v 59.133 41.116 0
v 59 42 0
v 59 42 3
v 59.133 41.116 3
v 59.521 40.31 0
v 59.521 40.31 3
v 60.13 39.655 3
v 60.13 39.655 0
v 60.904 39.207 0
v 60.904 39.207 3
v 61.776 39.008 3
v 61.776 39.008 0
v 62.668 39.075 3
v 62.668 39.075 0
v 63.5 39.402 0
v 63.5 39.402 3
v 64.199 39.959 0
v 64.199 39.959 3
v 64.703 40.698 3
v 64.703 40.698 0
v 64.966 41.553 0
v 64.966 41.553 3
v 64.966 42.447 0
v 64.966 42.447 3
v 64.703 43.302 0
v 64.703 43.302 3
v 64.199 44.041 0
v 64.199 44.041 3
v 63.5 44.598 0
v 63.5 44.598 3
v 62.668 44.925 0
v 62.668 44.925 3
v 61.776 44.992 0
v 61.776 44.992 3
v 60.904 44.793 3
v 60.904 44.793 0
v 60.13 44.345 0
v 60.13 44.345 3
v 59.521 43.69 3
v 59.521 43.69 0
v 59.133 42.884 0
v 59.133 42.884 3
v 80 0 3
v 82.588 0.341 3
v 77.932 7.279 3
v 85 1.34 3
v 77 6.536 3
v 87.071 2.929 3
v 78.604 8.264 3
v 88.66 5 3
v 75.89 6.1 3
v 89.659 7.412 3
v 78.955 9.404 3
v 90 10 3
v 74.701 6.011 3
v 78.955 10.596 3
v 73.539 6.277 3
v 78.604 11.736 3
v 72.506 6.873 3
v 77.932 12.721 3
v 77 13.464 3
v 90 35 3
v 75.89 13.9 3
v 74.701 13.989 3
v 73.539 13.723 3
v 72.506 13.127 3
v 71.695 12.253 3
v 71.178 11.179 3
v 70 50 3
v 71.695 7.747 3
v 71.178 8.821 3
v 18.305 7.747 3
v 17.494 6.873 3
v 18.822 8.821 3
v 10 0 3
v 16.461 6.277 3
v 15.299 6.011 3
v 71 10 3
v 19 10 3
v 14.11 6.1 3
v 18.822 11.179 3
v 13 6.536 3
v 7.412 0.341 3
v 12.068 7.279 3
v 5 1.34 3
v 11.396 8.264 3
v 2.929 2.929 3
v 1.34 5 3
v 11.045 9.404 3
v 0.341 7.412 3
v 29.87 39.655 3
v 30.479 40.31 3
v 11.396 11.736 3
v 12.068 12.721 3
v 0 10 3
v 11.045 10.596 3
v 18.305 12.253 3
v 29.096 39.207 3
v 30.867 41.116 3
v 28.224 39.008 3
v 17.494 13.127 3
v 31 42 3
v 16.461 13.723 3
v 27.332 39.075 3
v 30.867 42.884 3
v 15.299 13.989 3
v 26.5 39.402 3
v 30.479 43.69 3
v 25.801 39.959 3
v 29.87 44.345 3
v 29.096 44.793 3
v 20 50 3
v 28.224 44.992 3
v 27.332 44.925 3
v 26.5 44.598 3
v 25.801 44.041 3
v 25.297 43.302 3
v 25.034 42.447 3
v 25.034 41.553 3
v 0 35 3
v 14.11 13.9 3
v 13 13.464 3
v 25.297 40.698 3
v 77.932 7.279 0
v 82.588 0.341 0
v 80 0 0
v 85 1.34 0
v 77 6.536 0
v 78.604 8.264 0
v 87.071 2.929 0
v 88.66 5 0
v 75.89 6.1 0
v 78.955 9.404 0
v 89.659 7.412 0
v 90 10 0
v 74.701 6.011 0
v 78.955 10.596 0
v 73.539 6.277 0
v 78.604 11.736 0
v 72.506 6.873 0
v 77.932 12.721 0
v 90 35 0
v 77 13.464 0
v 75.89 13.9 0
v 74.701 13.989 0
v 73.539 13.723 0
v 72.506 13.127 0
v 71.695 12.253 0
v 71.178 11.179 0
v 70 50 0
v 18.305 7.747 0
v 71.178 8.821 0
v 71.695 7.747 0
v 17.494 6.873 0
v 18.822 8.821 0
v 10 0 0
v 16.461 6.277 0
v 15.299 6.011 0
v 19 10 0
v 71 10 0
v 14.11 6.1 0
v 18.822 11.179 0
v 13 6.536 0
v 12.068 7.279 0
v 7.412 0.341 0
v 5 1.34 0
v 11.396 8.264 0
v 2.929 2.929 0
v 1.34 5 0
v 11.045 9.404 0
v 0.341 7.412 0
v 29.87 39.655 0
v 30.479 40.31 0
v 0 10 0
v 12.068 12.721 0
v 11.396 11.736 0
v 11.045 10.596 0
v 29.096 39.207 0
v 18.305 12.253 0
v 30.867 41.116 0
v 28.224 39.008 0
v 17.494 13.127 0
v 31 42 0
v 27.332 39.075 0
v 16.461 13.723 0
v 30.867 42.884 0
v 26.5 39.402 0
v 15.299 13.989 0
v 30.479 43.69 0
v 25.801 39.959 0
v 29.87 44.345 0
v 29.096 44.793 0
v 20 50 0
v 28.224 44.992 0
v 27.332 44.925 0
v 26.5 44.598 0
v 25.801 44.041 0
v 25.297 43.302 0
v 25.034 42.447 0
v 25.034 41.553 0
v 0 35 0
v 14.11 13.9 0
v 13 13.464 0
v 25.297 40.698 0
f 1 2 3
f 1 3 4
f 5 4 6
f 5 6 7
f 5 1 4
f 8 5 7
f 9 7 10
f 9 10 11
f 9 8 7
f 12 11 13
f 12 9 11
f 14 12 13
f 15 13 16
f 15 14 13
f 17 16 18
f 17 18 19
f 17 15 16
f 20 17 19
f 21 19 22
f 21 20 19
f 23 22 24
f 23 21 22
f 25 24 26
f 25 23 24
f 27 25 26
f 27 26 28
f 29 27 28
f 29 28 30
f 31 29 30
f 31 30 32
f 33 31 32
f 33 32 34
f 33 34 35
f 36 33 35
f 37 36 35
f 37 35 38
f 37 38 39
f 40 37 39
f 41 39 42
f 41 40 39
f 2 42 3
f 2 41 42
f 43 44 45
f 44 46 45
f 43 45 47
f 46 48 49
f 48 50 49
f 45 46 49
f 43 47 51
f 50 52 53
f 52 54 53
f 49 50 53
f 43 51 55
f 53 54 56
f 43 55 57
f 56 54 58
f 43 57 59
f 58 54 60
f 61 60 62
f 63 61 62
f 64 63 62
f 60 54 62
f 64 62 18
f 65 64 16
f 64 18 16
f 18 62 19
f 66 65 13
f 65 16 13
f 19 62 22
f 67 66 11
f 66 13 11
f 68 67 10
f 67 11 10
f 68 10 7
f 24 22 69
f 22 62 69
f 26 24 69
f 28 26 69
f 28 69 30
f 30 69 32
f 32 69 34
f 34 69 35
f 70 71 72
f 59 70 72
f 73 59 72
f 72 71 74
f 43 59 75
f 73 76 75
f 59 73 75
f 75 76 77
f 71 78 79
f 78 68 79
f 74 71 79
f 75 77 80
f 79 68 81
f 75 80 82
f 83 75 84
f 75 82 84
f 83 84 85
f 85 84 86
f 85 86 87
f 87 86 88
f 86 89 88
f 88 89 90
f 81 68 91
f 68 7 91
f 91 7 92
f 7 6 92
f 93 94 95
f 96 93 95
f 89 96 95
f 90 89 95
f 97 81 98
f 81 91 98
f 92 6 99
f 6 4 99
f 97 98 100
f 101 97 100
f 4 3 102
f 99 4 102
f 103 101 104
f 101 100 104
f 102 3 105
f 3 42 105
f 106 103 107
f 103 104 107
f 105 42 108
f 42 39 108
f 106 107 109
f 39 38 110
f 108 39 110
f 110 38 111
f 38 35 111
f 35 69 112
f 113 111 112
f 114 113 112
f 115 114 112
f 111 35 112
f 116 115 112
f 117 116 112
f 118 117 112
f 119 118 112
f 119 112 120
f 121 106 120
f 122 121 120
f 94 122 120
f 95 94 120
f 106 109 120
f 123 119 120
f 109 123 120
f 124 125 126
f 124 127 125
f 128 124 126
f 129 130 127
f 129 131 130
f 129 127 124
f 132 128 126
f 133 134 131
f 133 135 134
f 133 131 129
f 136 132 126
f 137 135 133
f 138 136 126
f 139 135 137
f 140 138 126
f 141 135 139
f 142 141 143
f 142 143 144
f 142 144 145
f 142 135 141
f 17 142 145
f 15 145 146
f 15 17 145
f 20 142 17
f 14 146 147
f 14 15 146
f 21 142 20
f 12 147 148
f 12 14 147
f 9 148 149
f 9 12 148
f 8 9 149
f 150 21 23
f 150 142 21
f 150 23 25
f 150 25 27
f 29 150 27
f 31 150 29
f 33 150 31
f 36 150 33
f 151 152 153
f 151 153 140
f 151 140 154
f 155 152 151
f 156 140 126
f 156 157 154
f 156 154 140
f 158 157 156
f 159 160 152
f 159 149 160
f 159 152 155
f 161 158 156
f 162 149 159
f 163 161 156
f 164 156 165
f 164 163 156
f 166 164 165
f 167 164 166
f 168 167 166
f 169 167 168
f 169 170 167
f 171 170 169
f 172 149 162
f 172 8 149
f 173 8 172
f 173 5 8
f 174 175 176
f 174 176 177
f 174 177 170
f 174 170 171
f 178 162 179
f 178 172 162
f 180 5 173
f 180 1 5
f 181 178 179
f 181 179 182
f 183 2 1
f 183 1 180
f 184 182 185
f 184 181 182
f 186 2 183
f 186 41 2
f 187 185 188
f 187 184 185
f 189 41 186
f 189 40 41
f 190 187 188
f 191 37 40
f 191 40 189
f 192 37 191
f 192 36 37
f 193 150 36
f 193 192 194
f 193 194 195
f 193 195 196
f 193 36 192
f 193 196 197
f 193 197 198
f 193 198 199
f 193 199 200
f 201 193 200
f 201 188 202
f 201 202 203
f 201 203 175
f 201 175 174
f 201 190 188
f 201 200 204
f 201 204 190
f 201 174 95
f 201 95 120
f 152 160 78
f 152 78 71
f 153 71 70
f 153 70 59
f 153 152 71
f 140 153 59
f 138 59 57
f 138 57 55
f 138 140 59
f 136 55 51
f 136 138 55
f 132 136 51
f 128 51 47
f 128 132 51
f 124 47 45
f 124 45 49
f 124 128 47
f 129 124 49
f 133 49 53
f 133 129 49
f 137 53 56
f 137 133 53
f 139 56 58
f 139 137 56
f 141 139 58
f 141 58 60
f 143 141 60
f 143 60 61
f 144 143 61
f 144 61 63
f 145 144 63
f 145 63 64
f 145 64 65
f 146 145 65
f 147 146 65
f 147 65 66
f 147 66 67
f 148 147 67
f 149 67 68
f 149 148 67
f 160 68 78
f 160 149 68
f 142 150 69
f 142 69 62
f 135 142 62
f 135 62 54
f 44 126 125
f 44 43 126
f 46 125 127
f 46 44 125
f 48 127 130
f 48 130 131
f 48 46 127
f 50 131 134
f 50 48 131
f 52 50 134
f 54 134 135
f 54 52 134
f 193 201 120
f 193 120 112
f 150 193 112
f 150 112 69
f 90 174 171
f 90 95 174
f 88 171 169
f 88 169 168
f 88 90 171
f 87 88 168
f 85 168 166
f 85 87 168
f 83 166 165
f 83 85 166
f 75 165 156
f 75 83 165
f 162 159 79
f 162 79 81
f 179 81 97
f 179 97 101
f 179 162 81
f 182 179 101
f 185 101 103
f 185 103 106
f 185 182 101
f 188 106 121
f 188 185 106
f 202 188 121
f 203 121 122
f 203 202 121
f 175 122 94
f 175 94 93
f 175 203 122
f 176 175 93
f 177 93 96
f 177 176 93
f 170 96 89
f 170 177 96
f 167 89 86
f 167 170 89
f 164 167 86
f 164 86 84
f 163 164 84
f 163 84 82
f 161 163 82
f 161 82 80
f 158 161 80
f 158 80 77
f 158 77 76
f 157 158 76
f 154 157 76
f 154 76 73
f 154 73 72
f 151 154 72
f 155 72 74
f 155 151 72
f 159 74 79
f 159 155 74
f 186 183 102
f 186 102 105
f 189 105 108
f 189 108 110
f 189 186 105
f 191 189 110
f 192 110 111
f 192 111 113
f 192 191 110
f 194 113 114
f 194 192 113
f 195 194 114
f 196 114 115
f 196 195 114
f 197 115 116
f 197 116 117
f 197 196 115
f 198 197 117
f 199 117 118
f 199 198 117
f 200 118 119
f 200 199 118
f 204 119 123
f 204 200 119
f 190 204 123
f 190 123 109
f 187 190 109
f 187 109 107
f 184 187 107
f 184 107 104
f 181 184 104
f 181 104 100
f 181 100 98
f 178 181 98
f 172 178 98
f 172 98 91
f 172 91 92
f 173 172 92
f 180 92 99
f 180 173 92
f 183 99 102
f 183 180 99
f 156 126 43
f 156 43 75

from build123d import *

# Parameters (mm, degrees)
SKETCH1_R           = 3
SKETCH1_R_2         = 4
BOSS_EXTRUDE1_DEPTH = 3
FILLET1_R           = 10


with BuildPart() as part:
    # Sketch1 → Boss-Extrude1 (new body)
    with BuildSketch(Plane.XY):
        Polygon((0, 35), (20, 50), (70, 50), (90, 35), (90, 0), (0, 0), align=None)
        with Locations((28, 42)):
            Circle(SKETCH1_R, mode=Mode.SUBTRACT)
        with Locations((15, 10)):
            Circle(SKETCH1_R_2, mode=Mode.SUBTRACT)
        with Locations(Location((75, 10, 0), (0, 0, 180))):
            Circle(SKETCH1_R_2, mode=Mode.SUBTRACT)
        with Locations(Location((62, 42, 0), (0, 0, 180))):
            Circle(SKETCH1_R, mode=Mode.SUBTRACT)
    extrude(amount=BOSS_EXTRUDE1_DEPTH)

    # Fillet1
    fillet1_edges = [part.edges().sort_by_distance(p)[0] for p in [
        (90, 0, 1.5),
        (0, 0, 1.5),
    ]]
    fillet(fillet1_edges, radius=FILLET1_R)


solid = part.part
